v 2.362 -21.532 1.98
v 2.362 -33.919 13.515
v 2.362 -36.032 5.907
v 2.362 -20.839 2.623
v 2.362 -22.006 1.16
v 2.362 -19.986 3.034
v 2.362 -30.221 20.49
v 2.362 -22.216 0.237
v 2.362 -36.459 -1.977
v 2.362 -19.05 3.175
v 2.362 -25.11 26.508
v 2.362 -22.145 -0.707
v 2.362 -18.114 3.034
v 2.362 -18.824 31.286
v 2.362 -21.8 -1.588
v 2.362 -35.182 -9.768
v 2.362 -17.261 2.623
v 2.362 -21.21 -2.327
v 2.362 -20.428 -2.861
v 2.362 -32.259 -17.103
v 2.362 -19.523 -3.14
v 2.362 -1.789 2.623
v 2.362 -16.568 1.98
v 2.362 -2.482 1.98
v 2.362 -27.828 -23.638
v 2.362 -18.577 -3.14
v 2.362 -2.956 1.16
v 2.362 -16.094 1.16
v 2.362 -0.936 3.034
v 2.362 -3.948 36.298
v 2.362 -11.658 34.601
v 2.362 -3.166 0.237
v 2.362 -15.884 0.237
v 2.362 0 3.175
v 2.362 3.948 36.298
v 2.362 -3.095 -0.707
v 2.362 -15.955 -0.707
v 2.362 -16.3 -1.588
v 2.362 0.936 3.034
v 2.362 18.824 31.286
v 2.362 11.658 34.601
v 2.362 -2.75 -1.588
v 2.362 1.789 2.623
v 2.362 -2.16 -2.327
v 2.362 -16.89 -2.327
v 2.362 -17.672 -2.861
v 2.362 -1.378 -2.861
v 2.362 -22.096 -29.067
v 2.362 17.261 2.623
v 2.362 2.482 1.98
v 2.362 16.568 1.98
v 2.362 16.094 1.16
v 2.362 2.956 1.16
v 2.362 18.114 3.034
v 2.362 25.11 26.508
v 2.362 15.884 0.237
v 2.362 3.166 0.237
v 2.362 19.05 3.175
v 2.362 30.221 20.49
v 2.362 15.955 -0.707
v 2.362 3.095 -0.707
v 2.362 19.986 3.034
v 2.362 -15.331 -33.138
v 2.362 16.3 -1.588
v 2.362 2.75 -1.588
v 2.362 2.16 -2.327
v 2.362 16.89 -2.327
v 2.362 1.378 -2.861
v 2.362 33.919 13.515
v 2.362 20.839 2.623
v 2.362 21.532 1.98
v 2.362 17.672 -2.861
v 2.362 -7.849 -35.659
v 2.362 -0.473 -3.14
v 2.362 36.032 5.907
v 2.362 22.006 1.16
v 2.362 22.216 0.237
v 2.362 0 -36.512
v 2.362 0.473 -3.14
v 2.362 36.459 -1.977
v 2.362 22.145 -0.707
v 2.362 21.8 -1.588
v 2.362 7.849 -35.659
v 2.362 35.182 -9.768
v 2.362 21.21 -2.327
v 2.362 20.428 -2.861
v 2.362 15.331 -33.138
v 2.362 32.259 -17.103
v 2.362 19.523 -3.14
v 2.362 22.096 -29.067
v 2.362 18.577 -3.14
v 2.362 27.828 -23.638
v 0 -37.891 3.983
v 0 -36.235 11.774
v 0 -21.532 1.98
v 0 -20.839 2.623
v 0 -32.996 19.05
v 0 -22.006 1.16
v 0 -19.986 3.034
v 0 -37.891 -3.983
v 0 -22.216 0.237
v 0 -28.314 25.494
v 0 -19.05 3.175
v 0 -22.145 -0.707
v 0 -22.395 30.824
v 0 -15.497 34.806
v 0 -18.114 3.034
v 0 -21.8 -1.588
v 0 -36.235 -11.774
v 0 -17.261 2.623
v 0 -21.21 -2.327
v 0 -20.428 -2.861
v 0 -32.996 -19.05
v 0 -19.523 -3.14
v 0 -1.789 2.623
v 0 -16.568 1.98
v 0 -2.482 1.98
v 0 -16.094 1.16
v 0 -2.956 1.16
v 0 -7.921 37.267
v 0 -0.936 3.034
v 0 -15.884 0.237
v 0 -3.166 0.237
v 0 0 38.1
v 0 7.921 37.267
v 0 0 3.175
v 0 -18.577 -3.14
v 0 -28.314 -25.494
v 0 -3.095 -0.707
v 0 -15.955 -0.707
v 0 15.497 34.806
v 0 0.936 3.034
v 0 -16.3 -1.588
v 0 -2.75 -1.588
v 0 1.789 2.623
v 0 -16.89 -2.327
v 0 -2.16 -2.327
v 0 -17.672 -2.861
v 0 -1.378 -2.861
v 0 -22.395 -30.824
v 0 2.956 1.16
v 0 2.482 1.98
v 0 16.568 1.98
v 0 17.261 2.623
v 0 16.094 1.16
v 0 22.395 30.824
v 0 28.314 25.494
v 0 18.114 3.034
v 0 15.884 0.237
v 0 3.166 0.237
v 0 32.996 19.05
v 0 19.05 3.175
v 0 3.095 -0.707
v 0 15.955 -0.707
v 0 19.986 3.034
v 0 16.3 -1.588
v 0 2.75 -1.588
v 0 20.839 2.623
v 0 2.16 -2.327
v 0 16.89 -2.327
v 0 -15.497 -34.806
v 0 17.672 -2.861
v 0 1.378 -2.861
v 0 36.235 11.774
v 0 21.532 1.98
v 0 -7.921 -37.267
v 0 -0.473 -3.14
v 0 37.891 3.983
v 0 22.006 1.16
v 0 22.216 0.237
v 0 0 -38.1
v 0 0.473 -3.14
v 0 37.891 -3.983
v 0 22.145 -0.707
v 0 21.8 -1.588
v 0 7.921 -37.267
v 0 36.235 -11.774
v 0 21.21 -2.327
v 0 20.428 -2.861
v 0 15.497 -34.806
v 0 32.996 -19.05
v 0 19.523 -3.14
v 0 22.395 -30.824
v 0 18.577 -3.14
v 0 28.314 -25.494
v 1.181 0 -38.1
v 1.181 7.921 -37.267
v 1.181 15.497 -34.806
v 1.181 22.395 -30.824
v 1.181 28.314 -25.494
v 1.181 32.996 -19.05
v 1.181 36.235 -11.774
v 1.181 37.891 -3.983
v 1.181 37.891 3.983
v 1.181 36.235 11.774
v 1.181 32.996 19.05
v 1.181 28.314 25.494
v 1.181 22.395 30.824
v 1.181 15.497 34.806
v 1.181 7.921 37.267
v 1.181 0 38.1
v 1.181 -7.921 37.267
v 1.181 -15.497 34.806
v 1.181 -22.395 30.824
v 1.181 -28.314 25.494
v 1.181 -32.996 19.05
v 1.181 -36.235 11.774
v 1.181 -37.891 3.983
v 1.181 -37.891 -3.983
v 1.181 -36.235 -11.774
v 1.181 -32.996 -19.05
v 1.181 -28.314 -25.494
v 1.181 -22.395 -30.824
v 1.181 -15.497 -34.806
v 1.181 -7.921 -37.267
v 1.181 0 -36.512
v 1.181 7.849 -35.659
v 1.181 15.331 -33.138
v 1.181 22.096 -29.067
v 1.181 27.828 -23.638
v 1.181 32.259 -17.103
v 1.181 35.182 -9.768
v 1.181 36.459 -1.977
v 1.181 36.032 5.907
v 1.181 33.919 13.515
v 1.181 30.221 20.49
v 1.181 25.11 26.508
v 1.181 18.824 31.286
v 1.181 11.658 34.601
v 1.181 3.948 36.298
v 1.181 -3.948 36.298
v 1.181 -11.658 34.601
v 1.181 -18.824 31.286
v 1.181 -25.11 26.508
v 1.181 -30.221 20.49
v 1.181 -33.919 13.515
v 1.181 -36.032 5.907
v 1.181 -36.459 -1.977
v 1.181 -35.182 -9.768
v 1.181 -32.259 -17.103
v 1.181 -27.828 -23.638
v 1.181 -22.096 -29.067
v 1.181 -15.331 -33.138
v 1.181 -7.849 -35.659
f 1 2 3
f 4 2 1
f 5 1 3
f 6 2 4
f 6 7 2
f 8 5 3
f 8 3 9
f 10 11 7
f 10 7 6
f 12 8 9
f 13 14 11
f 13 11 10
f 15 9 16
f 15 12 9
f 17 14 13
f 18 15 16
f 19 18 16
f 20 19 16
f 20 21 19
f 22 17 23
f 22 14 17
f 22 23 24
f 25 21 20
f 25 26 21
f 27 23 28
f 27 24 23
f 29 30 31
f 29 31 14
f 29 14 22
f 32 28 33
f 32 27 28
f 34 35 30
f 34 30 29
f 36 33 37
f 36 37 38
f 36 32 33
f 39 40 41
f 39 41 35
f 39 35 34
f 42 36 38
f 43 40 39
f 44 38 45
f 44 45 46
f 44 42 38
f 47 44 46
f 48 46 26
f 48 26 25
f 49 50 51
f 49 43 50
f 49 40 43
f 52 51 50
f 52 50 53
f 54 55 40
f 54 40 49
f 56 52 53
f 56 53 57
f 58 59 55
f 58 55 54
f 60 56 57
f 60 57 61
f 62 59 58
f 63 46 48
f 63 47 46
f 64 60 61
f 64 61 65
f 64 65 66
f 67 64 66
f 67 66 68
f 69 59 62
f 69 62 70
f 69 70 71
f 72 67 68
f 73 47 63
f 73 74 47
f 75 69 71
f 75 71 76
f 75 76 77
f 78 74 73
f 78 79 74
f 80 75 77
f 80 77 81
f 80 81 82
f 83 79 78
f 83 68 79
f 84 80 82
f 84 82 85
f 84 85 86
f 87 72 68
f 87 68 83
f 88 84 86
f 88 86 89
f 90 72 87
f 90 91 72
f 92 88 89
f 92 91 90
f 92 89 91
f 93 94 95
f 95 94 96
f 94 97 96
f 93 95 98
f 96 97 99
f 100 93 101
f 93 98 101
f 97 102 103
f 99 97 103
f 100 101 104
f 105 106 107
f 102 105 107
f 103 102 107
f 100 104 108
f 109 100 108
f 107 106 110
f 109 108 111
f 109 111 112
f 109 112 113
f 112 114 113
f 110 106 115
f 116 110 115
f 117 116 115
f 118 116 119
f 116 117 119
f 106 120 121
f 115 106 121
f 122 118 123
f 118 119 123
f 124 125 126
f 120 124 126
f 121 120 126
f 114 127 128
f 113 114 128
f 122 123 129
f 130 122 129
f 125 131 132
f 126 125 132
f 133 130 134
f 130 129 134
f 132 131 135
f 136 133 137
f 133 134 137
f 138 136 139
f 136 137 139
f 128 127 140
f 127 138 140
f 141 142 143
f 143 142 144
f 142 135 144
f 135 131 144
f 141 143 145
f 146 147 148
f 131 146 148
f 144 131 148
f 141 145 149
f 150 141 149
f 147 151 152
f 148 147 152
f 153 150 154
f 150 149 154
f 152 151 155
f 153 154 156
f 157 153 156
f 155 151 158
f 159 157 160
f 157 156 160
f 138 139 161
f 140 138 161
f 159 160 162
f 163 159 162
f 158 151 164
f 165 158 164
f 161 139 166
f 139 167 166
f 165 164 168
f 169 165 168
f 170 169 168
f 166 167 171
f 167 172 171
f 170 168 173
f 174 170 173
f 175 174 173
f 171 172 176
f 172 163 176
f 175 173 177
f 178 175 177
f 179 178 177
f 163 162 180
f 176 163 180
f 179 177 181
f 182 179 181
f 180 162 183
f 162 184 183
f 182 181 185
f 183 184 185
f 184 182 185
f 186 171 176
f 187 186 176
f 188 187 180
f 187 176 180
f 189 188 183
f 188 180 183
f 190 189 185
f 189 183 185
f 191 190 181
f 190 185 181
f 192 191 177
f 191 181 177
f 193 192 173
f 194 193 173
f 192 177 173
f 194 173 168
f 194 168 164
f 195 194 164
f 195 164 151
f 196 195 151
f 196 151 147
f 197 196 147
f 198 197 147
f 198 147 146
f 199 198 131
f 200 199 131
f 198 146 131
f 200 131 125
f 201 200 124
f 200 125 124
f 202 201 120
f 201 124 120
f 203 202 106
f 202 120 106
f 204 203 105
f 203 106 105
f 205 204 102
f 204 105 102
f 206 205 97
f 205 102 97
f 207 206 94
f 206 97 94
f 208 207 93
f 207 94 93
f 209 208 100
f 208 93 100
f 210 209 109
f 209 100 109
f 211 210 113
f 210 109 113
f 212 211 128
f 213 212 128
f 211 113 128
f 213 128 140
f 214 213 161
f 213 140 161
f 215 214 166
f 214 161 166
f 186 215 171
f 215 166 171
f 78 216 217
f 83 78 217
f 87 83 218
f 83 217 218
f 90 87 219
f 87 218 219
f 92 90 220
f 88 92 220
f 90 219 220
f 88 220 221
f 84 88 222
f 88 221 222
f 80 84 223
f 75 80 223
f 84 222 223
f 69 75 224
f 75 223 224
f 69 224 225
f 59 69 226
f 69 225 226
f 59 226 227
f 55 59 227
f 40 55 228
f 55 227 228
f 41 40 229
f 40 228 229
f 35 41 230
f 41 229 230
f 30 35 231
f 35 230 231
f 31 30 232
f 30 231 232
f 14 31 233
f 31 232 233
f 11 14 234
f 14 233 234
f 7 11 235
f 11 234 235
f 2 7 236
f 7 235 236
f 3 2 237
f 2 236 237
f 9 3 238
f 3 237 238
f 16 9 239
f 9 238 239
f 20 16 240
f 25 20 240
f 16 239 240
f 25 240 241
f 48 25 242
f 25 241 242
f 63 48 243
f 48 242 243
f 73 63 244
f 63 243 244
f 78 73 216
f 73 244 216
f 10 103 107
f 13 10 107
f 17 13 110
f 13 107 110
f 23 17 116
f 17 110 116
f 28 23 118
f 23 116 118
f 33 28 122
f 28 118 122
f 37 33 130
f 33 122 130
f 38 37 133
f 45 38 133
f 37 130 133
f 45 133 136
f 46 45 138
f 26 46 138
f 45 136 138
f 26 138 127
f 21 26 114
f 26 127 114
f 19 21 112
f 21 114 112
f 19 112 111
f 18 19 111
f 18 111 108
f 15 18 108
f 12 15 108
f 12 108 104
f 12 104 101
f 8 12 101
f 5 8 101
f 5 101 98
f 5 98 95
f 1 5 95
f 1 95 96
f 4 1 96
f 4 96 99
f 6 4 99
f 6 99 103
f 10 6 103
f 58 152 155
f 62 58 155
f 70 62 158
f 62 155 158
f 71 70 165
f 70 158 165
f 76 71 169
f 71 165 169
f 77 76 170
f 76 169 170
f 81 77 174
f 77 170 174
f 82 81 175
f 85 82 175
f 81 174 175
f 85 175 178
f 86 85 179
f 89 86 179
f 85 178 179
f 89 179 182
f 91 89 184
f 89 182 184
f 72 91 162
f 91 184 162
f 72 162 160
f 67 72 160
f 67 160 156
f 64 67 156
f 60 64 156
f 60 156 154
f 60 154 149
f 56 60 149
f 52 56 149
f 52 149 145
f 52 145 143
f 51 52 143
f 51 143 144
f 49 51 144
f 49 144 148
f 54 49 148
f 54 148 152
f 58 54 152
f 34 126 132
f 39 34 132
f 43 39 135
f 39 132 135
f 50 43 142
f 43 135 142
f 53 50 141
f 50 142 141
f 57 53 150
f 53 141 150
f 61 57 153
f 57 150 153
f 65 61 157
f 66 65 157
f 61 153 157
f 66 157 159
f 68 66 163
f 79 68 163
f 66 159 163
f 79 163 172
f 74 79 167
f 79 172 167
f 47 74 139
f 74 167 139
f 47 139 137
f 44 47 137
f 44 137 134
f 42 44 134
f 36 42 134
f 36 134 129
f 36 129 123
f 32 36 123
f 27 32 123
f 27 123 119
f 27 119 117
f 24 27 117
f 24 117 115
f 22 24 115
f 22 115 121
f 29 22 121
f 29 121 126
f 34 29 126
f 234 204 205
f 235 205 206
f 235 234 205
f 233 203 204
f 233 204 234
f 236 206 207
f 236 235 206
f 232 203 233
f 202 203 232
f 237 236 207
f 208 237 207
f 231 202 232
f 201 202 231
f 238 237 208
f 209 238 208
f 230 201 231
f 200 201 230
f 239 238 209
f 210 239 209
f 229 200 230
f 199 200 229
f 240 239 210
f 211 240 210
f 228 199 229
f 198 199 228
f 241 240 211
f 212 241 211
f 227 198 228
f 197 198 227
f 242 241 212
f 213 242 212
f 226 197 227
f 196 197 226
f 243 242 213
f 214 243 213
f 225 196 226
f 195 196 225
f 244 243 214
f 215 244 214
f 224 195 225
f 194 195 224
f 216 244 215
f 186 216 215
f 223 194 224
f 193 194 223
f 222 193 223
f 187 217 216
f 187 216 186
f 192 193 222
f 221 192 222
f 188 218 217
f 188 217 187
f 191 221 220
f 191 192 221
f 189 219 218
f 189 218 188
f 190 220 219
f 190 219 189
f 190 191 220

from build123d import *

# Parameters (mm, degrees)
SKETCH1_R           = 38.1
BOSS_EXTRUDE1_DEPTH = 1.1811
SKETCH2_R           = 36.5125
BOSS_EXTRUDE2_DEPTH = 1.1811
SKETCH3_R           = 3.175
CUT_EXTRUDE1_DEPTH  = 54.933292027


with BuildPart() as part:
    # Sketch1 → Boss-Extrude1 (new body)
    with BuildSketch(Plane.YZ):
        with Locations(Location((0, 0, 0), (0, 0, 270))):
            Circle(SKETCH1_R)
    extrude(amount=BOSS_EXTRUDE1_DEPTH)

    # Sketch2 → Boss-Extrude2 (add)
    with BuildSketch(Plane.YZ.offset(1.1811)):
        with Locations(Location((0, 0, 0), (0, 0, 270))):
            Circle(SKETCH2_R)
    extrude(amount=BOSS_EXTRUDE2_DEPTH)

    # Sketch3 → Cut-Extrude1 (cut, through all)
    with BuildSketch(Plane(origin=(0, 0, 0), x_dir=(0, -1, 0), z_dir=(-1, 0, 0))):
        with Locations(Location((0, 0, 0), (0, 0, 90))):
            Circle(SKETCH3_R)
        with Locations(Location((19.05, 0, 0), (0, 0, 90))):
            Circle(SKETCH3_R)
        with Locations(Location((-19.05, 0, 0), (0, 0, 90))):
            Circle(SKETCH3_R)
    extrude(amount=-CUT_EXTRUDE1_DEPTH, mode=Mode.SUBTRACT)


solid = part.part
